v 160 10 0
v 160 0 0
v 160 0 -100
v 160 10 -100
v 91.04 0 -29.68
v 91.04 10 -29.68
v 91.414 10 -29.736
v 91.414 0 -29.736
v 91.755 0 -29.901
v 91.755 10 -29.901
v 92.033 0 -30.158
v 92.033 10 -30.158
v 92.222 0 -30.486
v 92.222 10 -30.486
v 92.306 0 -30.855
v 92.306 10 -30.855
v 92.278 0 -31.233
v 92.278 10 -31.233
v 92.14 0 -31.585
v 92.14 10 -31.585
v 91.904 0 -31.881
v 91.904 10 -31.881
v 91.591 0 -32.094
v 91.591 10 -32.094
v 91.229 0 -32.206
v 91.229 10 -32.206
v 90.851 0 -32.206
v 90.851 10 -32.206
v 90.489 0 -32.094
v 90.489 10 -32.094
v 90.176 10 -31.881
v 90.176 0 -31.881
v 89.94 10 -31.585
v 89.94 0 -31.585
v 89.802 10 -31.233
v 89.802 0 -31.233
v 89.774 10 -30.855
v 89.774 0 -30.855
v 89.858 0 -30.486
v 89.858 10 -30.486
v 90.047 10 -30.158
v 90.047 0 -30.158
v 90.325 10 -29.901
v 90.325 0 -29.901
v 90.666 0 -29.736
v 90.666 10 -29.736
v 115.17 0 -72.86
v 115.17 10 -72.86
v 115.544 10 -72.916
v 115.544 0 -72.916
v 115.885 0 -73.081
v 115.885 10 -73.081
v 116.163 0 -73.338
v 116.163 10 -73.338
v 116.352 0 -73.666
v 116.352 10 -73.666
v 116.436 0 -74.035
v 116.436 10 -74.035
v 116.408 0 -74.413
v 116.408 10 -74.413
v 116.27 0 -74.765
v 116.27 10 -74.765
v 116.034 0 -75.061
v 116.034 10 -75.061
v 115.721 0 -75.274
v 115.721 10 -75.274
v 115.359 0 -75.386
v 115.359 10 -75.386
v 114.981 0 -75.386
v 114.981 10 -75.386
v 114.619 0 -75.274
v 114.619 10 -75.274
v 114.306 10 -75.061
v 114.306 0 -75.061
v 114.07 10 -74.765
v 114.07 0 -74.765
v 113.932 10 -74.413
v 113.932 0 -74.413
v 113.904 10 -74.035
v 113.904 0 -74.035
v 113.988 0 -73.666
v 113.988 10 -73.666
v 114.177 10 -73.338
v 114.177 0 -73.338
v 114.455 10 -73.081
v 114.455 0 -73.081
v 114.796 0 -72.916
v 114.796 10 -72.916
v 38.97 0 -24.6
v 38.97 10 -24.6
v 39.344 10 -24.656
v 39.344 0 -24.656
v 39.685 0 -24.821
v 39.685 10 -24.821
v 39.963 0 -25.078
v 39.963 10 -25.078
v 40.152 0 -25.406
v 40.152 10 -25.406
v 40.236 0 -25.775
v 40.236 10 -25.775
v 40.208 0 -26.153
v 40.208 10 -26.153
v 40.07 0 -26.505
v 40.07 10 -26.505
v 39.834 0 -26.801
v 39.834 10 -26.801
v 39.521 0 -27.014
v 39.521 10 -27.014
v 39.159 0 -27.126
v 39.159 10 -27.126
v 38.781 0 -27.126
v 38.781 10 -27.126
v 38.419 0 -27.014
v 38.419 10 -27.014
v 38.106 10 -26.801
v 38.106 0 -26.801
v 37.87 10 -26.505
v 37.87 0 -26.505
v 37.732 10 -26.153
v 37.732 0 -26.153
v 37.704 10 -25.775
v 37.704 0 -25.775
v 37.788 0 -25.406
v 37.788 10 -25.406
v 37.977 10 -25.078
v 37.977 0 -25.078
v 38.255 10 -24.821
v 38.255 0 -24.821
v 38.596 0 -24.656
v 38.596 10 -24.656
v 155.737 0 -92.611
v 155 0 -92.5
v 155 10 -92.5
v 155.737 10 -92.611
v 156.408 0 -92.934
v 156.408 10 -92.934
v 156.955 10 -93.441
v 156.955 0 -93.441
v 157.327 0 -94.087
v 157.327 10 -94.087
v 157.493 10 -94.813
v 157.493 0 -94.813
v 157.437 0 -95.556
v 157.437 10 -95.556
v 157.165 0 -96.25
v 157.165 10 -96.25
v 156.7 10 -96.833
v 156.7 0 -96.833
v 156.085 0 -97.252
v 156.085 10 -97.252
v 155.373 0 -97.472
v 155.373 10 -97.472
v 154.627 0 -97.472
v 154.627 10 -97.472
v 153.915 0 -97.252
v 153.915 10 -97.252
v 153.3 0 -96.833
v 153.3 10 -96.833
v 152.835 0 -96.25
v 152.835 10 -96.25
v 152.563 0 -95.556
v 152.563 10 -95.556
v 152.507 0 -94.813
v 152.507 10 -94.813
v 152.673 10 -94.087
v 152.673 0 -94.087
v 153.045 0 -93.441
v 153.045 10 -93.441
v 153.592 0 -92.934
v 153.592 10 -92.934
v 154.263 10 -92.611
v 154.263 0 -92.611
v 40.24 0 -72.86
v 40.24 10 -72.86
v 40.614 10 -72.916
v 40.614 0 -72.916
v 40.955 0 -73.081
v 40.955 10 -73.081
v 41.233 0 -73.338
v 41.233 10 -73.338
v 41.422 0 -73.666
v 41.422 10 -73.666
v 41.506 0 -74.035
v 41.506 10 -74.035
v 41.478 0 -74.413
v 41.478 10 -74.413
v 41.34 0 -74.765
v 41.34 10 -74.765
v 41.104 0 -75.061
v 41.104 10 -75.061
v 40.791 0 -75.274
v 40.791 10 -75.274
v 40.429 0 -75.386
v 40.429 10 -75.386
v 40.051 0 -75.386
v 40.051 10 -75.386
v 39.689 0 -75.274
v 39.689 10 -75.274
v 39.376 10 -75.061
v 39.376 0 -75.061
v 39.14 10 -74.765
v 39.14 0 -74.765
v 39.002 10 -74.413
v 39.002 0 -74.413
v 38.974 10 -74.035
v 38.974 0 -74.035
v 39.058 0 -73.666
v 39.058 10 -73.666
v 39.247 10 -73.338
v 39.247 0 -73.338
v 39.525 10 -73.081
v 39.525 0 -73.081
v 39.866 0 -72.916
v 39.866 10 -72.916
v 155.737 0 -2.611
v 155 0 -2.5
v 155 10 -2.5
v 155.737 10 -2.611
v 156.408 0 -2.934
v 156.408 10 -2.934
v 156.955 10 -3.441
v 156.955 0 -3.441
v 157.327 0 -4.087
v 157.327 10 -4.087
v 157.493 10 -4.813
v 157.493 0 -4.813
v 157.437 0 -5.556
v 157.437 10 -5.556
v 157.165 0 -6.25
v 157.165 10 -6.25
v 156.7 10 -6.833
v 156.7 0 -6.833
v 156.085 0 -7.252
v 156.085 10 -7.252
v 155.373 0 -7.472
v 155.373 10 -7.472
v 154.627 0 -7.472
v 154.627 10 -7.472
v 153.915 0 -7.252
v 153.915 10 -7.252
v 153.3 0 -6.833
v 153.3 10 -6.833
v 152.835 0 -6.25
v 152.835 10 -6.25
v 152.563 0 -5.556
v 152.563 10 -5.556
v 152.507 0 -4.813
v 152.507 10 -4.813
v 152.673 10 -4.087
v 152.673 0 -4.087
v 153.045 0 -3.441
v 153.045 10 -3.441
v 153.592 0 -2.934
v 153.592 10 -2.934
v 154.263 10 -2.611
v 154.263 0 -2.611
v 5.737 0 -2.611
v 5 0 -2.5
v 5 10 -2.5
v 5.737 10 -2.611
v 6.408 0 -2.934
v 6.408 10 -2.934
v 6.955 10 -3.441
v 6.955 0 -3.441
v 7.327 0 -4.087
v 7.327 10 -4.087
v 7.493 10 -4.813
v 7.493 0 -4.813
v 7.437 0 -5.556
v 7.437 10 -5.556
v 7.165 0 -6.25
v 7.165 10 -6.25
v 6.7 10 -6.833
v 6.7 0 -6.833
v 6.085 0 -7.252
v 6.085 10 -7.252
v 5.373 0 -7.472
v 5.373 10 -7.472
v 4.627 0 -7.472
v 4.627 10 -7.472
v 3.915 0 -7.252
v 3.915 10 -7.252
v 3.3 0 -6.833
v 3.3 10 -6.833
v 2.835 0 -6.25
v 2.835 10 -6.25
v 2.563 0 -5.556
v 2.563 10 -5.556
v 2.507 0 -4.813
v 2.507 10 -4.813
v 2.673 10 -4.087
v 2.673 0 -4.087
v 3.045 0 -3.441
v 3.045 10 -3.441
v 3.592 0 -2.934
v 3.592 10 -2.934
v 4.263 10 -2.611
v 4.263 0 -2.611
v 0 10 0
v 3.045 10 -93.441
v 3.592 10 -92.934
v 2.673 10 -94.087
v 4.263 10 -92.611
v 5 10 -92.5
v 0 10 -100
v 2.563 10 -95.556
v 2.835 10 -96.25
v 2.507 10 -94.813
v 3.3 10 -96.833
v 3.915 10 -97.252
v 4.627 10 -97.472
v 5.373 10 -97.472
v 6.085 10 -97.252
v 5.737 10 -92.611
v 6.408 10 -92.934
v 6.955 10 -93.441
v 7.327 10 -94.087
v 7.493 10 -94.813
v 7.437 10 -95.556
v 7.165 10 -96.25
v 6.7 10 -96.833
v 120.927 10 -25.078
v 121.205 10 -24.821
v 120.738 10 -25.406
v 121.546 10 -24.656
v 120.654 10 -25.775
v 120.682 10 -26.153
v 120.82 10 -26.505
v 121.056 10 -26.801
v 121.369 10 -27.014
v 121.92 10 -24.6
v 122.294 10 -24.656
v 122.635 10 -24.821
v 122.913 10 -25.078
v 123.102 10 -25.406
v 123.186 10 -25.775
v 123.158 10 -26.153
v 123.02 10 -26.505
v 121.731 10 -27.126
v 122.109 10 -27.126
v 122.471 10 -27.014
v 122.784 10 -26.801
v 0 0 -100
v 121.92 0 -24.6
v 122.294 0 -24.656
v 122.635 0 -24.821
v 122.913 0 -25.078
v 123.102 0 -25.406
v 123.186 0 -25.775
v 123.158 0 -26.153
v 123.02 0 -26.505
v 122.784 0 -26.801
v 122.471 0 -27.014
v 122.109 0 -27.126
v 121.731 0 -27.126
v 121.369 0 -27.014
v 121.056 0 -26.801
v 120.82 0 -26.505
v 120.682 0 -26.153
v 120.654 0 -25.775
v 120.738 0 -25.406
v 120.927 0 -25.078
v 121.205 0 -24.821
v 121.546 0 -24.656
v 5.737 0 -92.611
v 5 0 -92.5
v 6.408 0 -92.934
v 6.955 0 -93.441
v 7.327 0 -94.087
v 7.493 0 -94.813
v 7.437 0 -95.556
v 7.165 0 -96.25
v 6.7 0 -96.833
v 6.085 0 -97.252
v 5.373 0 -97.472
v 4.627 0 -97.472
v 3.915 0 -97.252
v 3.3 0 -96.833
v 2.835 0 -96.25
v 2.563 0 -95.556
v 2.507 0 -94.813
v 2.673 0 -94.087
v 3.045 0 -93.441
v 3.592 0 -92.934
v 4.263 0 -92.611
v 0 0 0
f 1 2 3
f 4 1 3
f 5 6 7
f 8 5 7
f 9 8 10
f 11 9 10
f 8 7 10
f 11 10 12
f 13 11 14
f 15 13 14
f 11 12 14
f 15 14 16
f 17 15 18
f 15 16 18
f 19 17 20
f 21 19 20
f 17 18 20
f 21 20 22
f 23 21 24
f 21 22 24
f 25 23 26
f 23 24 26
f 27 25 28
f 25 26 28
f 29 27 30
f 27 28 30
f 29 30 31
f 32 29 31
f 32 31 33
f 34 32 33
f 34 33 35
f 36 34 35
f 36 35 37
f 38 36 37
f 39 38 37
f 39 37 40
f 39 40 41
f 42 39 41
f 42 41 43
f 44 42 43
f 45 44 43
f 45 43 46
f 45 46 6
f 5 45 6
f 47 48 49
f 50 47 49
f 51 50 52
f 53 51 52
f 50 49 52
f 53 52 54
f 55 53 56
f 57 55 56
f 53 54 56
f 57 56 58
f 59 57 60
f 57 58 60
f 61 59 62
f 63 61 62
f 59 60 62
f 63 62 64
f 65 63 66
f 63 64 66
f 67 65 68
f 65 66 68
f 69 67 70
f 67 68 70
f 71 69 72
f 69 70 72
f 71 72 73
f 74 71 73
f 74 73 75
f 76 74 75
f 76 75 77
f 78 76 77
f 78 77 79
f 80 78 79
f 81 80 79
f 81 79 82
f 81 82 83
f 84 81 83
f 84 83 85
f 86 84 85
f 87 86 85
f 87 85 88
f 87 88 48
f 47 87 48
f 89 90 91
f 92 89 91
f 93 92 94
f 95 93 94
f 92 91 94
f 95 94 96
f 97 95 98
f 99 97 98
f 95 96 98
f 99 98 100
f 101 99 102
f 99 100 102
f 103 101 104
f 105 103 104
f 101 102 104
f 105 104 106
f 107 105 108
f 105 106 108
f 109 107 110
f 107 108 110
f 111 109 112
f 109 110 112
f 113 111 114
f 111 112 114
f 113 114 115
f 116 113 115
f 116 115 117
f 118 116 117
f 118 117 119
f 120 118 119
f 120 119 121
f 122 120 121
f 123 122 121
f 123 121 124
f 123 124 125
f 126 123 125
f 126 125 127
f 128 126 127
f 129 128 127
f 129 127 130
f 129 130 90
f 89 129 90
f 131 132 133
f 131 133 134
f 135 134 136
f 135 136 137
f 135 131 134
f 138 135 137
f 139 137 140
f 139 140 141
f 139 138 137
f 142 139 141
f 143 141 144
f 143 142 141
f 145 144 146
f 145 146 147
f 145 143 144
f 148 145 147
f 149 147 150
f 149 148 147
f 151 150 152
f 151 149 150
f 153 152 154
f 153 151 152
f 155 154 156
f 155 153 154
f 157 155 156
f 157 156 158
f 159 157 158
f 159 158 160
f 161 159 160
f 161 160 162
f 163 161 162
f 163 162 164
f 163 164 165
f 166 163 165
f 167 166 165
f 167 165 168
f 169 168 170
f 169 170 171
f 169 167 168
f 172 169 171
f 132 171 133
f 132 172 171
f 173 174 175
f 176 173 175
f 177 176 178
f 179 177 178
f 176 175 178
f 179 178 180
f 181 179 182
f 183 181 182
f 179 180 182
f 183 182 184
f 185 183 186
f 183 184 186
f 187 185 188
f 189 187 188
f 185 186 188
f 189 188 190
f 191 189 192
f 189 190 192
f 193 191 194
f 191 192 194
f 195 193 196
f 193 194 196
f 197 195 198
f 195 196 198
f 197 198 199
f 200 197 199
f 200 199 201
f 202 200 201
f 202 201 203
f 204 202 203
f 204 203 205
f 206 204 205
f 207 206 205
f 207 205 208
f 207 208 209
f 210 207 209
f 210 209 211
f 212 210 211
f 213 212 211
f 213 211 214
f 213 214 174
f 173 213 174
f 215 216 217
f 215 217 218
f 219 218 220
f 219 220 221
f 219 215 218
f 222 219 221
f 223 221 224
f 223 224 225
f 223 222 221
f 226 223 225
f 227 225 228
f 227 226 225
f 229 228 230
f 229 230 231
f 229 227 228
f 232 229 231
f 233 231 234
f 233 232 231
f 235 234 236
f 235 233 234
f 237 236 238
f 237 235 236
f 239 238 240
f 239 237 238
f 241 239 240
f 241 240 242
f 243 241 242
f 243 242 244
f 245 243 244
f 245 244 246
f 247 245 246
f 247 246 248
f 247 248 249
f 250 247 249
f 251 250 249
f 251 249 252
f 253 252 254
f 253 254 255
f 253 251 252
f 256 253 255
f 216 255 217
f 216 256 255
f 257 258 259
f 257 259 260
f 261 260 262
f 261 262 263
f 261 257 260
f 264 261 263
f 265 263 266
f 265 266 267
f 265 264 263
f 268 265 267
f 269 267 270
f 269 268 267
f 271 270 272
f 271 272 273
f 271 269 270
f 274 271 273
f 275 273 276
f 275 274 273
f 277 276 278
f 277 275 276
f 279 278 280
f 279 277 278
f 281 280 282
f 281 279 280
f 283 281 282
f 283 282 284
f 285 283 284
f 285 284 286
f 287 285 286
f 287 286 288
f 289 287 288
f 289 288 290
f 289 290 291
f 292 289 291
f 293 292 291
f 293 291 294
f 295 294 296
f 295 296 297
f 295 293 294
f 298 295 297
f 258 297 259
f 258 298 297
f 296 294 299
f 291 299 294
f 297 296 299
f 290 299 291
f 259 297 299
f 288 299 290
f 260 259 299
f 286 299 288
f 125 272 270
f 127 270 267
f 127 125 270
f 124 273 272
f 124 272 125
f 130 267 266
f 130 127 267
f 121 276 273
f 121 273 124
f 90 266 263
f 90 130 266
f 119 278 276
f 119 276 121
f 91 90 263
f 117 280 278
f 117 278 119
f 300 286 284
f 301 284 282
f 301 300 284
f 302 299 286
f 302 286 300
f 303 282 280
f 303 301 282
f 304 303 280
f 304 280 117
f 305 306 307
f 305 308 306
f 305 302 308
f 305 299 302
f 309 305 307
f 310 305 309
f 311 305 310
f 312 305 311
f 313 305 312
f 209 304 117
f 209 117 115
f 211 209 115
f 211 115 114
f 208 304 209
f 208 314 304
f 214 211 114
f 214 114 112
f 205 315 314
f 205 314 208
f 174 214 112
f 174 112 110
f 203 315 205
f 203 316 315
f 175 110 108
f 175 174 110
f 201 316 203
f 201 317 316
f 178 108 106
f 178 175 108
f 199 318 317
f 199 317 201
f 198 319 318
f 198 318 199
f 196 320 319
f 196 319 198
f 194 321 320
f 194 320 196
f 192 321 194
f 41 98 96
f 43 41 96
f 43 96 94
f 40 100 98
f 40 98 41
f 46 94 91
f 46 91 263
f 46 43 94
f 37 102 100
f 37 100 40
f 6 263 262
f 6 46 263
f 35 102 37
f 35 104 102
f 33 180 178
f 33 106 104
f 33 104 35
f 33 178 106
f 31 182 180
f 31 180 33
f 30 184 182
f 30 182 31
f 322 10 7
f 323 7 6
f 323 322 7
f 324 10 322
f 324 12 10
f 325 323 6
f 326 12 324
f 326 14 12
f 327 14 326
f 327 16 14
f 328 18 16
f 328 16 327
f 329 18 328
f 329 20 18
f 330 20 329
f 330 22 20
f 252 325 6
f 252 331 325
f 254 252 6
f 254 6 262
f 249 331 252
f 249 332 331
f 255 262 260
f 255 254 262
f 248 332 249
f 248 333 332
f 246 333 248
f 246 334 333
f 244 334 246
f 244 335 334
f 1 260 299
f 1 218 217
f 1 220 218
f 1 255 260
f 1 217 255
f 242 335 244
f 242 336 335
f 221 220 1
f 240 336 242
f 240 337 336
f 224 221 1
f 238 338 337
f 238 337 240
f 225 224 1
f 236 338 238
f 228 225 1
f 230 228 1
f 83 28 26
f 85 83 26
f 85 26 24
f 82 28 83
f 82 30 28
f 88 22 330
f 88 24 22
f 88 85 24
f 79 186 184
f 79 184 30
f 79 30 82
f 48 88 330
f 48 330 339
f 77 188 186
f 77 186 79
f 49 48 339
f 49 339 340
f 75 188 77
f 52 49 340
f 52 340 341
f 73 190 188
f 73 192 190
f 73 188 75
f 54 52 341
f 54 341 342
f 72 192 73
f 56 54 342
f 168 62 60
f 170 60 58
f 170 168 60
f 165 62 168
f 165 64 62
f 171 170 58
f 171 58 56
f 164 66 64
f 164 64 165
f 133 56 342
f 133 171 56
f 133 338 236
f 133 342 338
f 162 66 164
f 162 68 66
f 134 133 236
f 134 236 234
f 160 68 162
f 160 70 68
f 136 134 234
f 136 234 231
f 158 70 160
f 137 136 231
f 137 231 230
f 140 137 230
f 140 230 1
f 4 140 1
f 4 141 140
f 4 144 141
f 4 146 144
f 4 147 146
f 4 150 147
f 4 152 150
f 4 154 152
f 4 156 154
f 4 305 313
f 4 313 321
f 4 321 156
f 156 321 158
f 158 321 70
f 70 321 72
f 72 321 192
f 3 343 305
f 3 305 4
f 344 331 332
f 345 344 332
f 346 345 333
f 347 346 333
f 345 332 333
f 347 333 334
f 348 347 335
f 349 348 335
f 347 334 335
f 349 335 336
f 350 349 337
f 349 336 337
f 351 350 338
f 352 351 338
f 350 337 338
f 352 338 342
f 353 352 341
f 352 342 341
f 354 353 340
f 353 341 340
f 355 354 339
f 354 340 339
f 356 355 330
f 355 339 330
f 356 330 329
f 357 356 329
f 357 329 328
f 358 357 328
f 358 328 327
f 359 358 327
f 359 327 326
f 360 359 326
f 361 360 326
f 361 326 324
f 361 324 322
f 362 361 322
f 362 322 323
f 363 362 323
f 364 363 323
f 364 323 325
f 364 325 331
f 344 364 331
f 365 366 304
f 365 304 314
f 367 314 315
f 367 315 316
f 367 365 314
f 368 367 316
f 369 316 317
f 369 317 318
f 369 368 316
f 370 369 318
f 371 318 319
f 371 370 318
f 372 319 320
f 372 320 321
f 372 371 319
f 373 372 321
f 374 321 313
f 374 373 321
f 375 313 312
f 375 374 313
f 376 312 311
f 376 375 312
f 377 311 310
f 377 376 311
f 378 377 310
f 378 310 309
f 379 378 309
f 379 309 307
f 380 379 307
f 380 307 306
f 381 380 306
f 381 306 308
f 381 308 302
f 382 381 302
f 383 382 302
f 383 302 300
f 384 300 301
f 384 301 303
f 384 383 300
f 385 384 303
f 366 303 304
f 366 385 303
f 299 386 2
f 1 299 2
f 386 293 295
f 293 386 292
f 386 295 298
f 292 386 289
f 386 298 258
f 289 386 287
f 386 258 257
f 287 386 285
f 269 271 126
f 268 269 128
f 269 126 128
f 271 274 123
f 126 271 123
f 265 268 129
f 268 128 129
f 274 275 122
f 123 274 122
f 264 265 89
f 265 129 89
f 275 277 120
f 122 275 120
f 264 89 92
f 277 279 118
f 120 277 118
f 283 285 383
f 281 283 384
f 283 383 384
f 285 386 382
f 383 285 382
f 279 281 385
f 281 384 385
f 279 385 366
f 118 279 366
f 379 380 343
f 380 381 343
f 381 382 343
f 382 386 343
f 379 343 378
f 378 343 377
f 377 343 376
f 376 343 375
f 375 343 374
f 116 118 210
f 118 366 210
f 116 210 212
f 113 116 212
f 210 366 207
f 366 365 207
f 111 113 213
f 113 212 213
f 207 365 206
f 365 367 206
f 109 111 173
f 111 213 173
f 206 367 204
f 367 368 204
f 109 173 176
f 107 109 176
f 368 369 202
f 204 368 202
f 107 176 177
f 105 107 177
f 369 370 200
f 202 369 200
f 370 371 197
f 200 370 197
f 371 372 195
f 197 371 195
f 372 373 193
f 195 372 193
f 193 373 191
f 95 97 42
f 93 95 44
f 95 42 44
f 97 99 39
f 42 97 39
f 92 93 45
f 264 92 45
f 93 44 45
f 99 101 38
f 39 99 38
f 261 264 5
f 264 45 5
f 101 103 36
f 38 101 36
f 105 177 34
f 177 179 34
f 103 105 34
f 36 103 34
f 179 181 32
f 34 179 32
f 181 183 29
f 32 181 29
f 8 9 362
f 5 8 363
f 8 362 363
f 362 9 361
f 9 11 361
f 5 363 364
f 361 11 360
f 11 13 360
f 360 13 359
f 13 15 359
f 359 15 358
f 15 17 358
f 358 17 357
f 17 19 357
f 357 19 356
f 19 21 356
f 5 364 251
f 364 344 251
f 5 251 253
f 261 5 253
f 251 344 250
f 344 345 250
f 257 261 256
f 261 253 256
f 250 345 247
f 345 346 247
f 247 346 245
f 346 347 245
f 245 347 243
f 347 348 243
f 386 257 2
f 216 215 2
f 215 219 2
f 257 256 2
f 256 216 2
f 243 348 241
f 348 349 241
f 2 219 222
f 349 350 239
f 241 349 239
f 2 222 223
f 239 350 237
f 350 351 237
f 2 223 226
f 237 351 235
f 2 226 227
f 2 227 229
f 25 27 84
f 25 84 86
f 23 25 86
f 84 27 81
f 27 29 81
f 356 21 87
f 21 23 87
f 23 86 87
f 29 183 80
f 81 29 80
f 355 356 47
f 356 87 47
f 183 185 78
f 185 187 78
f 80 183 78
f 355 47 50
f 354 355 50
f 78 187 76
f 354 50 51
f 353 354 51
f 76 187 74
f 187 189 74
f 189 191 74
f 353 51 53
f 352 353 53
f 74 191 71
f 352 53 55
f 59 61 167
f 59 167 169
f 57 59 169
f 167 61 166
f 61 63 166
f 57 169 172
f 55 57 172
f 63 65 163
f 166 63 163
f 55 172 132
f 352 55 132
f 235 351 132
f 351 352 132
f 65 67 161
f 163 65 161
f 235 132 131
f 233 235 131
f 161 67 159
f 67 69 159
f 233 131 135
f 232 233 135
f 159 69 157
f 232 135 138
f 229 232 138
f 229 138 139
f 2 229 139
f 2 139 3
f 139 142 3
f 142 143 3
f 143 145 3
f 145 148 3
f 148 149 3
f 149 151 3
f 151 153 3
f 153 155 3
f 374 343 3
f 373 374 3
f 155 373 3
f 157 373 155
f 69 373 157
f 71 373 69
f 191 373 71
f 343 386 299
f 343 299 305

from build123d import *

# Parameters (mm, degrees)
ESQUISSE1_W             = 160
ESQUISSE1_H             = 100
ESQUISSE1_R             = 2.5
BOSS_EXTRU_1_DEPTH      = 10
ESQUISSE2_R             = 1.27
ENL_V_MAT_EXTRU_1_DEPTH = 189.944436277


with BuildPart() as part:
    # Esquisse1 → Boss.-Extru.1 (new body)
    with BuildSketch(Plane(origin=(0, 0, 0), x_dir=(1, 0, 0), z_dir=(0, 1, 0))):
        with Locations((80, 50)):
            Rectangle(ESQUISSE1_W, ESQUISSE1_H)
        with Locations(Location((5, 95, 0), (0, 0, 270))):
            Circle(ESQUISSE1_R, mode=Mode.SUBTRACT)
        with Locations(Location((5, 5, 0), (0, 0, 270))):
            Circle(ESQUISSE1_R, mode=Mode.SUBTRACT)
        with Locations(Location((155, 95, 0), (0, 0, 270))):
            Circle(ESQUISSE1_R, mode=Mode.SUBTRACT)
        with Locations(Location((155, 5, 0), (0, 0, 270))):
            Circle(ESQUISSE1_R, mode=Mode.SUBTRACT)
    extrude(amount=BOSS_EXTRU_1_DEPTH)

    # Esquisse2 → Enlèv. mat.-Extru.1 (cut, through all)
    with BuildSketch(Plane(origin=(0, 10, 0), x_dir=(1, 0, 0), z_dir=(0, 1, 0))):
        with Locations(Location((40.24, 74.13, 0), (0, 0, 270))):
            Circle(ESQUISSE2_R)
        with Locations(Location((38.97, 25.87, 0), (0, 0, 270))):
            Circle(ESQUISSE2_R)
        with Locations(Location((91.04, 30.95, 0), (0, 0, 270))):
            Circle(ESQUISSE2_R)
        with Locations(Location((121.92, 25.87, 0), (0, 0, 270))):
            Circle(ESQUISSE2_R)
        with Locations(Location((115.17, 74.13, 0), (0, 0, 270))):
            Circle(ESQUISSE2_R)
    extrude(amount=-ENL_V_MAT_EXTRU_1_DEPTH, mode=Mode.SUBTRACT)


solid = part.part
